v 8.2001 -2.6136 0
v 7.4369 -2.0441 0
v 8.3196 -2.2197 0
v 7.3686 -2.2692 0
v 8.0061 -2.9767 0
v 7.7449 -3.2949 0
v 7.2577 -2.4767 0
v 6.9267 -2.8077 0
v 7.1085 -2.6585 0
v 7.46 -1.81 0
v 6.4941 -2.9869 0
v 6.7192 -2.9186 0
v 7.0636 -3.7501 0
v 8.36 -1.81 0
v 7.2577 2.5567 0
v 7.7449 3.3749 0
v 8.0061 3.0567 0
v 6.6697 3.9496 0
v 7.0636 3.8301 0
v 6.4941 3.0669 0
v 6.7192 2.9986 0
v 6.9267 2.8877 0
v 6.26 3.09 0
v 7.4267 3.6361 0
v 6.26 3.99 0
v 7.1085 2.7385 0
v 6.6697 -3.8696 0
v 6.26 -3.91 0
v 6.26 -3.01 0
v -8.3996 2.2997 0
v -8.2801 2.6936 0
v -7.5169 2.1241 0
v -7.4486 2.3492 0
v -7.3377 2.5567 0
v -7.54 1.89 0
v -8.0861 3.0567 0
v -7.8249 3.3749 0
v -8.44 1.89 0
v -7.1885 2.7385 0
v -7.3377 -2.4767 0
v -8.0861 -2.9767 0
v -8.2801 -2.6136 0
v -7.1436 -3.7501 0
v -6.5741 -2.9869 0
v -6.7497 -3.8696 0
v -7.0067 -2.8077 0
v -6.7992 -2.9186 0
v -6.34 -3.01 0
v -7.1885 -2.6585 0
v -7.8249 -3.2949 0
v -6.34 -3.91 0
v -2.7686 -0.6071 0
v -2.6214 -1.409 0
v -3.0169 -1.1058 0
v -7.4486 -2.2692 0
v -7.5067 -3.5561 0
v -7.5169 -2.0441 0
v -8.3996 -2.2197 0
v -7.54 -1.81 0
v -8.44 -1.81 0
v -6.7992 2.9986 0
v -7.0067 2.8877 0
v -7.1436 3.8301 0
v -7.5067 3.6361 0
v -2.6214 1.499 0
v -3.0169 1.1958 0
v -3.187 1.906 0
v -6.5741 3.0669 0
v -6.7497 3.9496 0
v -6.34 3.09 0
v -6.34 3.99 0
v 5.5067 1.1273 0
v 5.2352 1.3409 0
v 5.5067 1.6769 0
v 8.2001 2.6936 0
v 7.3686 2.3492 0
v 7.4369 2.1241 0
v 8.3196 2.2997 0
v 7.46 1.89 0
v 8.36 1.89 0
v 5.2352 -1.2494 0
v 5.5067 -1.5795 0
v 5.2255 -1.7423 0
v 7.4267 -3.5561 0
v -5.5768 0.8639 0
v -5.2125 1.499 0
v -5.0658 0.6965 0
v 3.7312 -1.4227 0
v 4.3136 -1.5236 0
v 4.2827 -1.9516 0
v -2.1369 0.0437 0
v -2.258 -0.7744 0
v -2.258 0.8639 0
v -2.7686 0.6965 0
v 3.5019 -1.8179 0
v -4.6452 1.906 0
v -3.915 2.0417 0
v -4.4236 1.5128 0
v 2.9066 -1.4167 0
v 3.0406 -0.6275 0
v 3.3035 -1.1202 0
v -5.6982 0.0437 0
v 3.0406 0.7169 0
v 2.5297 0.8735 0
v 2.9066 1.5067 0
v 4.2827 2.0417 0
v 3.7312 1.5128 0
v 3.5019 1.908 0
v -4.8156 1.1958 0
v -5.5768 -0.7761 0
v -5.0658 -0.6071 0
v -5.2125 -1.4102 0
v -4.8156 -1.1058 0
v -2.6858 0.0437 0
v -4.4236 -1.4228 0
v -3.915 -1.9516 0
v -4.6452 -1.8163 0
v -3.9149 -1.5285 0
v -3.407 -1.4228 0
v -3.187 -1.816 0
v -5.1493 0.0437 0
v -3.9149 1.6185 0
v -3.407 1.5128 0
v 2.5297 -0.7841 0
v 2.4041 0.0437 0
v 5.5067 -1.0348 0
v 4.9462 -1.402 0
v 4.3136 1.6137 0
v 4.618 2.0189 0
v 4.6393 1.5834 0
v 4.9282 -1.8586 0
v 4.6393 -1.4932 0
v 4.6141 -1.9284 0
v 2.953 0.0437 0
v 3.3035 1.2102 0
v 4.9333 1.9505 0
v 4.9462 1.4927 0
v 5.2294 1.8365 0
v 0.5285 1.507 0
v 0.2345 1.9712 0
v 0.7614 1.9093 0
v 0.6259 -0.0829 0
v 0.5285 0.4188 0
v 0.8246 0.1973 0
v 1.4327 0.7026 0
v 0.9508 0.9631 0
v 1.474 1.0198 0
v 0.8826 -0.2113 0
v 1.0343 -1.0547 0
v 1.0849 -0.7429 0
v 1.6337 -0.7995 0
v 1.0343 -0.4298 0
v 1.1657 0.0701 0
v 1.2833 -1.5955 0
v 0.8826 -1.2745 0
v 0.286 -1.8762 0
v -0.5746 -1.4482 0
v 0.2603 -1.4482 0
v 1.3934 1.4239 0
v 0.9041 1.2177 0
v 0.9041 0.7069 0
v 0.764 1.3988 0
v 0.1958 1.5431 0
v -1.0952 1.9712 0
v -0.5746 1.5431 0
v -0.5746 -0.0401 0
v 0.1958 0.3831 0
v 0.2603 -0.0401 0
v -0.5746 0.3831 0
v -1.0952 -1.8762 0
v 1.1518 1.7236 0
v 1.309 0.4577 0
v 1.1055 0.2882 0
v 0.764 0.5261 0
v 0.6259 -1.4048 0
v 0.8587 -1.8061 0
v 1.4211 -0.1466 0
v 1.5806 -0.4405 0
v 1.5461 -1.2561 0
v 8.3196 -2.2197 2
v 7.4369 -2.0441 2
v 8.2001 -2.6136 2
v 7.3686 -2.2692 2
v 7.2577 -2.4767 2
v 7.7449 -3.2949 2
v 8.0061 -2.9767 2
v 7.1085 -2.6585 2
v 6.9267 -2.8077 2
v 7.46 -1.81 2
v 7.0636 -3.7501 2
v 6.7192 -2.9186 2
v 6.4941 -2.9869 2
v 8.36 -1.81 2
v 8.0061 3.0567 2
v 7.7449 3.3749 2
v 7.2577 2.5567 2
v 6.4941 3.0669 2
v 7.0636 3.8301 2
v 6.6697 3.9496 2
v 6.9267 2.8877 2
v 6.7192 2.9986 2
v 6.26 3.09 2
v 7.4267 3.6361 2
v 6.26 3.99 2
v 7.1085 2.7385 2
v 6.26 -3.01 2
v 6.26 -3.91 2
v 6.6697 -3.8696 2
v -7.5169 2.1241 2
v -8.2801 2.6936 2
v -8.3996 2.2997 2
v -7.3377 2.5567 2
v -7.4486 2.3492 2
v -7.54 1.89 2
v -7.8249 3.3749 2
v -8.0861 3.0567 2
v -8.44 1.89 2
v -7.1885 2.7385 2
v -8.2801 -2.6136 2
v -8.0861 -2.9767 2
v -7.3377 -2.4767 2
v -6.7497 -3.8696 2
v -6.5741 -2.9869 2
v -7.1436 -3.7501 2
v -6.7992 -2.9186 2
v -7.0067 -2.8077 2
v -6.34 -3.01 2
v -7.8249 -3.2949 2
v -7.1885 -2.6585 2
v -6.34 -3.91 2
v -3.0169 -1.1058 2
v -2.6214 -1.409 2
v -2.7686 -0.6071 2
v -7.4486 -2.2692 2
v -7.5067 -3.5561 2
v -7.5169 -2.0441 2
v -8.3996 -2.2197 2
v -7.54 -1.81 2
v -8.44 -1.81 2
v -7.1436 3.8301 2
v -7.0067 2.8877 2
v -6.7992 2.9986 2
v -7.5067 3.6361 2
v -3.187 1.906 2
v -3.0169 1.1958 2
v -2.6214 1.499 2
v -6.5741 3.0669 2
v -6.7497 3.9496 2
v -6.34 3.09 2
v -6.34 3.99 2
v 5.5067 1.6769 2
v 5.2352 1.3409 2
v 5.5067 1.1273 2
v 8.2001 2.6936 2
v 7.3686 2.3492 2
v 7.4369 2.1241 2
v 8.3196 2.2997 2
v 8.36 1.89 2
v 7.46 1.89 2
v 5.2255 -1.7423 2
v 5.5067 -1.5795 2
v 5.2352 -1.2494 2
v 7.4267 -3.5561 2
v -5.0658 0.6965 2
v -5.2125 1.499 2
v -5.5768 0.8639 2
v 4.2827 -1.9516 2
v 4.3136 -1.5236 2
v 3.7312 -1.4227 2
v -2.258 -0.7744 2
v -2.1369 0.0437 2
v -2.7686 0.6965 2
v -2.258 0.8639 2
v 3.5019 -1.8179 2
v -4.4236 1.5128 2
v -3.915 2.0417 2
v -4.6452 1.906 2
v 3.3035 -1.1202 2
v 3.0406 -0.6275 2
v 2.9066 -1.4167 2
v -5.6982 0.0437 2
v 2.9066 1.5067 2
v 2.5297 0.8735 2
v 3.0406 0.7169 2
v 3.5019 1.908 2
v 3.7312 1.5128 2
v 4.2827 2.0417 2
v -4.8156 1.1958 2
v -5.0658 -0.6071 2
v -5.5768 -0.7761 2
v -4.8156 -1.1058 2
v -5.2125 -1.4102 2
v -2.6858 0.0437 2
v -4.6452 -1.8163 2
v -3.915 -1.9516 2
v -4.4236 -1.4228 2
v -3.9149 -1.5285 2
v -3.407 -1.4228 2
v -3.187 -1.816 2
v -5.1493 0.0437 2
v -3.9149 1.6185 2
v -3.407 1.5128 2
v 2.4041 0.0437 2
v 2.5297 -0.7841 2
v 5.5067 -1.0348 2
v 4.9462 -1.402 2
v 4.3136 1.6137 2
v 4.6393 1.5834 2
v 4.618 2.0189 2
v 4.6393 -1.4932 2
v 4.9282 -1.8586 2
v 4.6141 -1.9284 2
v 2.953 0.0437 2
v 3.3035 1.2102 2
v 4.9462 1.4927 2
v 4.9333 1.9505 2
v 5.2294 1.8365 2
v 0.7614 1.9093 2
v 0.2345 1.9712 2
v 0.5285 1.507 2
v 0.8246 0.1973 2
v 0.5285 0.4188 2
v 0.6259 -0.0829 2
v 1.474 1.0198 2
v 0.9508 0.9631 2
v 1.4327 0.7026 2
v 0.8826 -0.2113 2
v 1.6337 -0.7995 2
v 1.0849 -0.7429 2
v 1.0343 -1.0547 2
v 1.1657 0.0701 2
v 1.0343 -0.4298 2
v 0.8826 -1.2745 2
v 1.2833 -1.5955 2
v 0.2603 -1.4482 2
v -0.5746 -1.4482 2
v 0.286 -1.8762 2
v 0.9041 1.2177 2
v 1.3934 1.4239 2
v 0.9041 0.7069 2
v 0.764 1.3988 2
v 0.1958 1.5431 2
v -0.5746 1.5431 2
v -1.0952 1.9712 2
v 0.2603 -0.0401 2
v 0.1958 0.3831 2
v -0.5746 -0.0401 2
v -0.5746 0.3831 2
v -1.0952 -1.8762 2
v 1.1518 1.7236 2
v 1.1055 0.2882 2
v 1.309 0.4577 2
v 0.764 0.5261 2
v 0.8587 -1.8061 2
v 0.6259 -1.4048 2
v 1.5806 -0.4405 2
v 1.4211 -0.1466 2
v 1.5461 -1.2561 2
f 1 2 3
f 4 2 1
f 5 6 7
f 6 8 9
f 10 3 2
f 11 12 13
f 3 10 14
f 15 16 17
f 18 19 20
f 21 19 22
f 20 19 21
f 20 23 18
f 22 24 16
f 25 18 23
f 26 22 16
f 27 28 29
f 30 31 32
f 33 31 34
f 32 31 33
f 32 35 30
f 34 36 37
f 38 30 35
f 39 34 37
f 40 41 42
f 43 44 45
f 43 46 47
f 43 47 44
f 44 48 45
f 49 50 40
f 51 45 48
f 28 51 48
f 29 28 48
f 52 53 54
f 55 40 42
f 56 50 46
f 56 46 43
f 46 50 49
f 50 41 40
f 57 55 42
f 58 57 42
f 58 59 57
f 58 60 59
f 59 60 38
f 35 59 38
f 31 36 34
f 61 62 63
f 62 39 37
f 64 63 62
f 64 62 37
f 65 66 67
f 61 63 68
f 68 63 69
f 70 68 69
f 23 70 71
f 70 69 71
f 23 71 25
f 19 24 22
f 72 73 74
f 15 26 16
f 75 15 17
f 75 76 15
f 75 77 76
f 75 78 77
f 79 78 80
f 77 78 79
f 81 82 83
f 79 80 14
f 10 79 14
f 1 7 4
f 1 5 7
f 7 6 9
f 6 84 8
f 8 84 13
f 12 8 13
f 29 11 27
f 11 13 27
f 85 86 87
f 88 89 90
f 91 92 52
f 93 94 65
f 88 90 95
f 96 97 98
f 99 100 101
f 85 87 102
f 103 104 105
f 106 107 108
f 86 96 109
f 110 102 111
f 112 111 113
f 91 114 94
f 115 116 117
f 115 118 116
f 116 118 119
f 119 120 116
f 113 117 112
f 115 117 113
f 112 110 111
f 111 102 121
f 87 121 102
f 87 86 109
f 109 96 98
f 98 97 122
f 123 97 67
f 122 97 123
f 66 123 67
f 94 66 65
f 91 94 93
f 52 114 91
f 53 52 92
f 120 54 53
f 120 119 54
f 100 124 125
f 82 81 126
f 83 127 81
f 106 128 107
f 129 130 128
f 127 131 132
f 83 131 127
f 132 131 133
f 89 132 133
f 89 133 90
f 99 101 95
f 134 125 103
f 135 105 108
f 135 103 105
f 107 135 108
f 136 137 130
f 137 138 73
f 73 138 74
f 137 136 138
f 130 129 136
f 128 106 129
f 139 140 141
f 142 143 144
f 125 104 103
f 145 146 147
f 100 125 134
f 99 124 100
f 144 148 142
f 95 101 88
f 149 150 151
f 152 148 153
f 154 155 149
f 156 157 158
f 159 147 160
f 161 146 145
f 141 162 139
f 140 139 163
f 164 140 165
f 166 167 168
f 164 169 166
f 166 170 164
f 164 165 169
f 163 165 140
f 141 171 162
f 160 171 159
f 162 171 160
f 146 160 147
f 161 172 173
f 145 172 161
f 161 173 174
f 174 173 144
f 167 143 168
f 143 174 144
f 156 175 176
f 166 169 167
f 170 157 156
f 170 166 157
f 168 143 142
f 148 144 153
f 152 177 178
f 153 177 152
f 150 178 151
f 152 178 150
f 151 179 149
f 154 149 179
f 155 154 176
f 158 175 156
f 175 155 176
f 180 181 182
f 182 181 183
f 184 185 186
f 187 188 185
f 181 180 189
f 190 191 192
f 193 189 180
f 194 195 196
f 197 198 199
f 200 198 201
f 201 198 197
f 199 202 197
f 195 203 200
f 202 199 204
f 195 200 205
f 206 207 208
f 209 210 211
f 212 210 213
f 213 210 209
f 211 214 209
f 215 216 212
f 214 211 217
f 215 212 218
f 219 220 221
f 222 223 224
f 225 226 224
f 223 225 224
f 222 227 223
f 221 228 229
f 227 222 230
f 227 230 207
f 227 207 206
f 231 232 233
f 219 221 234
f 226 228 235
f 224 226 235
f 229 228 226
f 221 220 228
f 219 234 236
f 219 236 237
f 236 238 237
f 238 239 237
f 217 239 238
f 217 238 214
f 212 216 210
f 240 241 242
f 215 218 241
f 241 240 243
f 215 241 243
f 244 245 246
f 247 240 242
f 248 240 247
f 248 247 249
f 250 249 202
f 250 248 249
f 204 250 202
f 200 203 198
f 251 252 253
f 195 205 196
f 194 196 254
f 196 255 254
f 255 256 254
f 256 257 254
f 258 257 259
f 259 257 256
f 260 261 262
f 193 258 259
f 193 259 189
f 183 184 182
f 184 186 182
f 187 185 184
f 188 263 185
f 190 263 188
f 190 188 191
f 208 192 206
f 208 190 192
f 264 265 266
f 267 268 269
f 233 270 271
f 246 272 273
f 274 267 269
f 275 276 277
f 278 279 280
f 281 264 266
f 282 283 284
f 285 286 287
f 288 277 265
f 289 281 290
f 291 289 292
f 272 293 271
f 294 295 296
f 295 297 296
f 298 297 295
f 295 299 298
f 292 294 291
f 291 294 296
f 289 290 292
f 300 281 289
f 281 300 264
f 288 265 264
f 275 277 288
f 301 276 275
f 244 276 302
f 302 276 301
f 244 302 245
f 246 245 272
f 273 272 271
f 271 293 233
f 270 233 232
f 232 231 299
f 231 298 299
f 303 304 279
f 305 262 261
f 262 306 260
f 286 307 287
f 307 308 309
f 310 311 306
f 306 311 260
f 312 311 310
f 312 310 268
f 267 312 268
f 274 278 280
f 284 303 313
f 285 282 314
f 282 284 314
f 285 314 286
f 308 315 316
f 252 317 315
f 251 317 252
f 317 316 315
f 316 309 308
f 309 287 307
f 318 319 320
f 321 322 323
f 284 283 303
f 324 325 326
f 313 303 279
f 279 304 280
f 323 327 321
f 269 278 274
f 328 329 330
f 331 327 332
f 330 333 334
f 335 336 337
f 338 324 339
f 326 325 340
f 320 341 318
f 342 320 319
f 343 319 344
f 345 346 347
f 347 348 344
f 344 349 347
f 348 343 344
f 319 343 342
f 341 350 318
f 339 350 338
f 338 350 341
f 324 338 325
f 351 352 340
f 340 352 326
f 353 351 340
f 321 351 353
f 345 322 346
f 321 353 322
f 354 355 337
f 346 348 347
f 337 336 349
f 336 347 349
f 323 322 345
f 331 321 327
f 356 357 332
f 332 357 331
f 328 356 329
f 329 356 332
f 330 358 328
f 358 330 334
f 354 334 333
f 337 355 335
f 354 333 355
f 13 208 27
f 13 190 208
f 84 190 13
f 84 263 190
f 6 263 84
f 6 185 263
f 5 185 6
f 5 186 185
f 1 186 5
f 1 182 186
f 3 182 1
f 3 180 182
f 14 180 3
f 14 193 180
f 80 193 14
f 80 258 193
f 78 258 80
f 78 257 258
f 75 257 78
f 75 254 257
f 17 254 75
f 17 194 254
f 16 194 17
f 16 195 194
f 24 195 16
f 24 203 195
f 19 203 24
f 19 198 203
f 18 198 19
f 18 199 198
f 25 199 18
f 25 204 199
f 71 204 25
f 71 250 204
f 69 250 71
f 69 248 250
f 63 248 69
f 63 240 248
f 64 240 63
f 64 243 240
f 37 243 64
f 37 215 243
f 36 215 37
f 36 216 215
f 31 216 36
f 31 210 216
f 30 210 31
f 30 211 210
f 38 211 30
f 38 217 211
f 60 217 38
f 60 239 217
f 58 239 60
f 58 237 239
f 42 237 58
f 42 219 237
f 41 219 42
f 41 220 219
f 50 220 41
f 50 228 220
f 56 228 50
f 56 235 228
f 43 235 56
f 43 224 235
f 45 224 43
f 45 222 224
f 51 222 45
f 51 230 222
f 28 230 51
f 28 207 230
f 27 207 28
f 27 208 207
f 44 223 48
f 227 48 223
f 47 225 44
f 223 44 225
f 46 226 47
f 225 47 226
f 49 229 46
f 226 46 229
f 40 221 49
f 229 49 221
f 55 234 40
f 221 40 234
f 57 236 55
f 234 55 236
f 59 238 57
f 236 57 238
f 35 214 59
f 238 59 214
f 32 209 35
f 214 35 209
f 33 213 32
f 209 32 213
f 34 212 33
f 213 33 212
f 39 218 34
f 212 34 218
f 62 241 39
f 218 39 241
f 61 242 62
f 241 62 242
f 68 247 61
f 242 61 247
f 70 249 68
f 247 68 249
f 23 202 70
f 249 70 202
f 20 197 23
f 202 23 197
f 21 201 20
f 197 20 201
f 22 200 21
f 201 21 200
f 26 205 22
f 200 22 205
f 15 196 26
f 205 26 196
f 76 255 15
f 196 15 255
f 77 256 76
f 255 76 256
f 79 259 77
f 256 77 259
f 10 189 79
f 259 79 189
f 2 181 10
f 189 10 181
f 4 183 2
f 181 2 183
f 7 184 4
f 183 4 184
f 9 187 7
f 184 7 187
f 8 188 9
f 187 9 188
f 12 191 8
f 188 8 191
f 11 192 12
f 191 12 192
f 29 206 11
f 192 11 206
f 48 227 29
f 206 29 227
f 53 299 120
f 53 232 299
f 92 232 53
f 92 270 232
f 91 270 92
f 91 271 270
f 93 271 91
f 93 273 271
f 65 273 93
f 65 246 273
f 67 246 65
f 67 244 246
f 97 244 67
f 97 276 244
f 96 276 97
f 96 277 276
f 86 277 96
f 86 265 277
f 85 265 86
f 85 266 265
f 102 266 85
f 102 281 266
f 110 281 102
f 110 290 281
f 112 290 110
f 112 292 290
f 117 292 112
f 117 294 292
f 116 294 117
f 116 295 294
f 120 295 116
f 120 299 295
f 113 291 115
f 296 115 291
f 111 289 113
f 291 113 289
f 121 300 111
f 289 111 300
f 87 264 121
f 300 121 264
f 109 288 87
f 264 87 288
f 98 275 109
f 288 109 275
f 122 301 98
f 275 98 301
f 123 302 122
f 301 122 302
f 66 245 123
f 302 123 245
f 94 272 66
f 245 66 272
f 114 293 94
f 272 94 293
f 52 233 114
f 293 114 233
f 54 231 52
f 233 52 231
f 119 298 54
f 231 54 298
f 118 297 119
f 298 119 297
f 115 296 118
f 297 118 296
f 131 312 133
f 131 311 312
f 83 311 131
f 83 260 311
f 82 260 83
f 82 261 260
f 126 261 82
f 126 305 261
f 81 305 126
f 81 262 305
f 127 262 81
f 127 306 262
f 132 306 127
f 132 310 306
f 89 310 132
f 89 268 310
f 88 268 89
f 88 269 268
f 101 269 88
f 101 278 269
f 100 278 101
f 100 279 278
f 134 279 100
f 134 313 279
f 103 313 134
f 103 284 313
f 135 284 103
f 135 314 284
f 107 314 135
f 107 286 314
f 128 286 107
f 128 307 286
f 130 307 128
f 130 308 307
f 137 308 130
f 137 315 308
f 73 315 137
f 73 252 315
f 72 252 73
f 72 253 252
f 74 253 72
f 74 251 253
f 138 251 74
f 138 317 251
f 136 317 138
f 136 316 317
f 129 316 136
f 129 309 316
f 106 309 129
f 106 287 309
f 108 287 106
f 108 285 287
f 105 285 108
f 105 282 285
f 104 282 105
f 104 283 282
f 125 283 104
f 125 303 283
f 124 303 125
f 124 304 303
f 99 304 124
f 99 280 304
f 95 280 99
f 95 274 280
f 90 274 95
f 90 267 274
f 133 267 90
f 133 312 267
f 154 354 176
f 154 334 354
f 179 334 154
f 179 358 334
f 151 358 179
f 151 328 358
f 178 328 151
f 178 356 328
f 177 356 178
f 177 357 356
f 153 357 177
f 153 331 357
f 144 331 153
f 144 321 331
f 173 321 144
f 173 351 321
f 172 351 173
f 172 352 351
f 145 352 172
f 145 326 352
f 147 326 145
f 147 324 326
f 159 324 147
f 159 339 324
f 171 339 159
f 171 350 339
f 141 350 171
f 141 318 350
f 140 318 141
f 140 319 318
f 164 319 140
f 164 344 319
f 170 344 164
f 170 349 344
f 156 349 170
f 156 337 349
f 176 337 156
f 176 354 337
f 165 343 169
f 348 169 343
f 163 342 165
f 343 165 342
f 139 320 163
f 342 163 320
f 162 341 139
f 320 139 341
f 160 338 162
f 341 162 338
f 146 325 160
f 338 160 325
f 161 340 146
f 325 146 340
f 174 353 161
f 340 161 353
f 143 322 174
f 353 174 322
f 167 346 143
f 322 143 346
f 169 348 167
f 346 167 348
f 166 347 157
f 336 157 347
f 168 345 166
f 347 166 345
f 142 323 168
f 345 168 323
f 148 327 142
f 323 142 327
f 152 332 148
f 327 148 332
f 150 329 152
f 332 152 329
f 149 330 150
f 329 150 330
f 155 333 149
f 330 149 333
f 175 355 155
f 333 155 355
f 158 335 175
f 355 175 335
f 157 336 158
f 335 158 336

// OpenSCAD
// Five candidate OBC marks (2026-10-14), each drawn at the smallest size it
// engraves cleanly under a print, 16 to 22 mm across. The same 2D shape is the
// logo and the cutter, so what the preview shows is what the printer gets.
//
// design = 1..5; each is 2D, centred on the origin, in mm.
//   1 stamp    OBC in a heavy sans inside a rounded frame, a maker's stamp
//   2 scallop  OBC in rounded letters inside a scalloped badge, like a sticker
//   3 ribbon   OBC knocked out of a ribbon banner
//   4 face     a round O with a kawaii face, then BC
//   5 toolpath OBC in one even line with round ends, as the nozzle draws it
design = 1;

// a stroke this wide is two beads on the 0.4 mm nozzle: the floor for every
// line, and for every wall left between two cuts
B2 = 0.9;

module ring(od, w) difference() { circle(d = od, $fn = 96); circle(d = od - 2 * w, $fn = 96); }

// Every stroke is opened by a bead: offset in by half a bead, back out. What
// a 0.4 mm nozzle cannot draw is taken out of the drawing, so the logo and the
// print agree.
module printable() offset(r = 0.21, $fn = 12) offset(delta = -0.21) children();
// and every gap between strokes closed if it is narrower than a wall
module closed() offset(r = -B2 / 2, $fn = 12) offset(delta = B2 / 2) children();

// the frame clears the letters by 1.1 everywhere, a wall two beads and more
module stamp() {
    text("OBC", size = 3.8, font = "Montserrat:style=Black", halign = "center", valign = "center", spacing = 1.08);
    translate([-0.04, 0.04]) difference() {
        offset(r = 2.1, $fn = 32) square([12.6, 3.7], center = true);
        offset(r = 1.2, $fn = 32) square([12.6, 3.7], center = true);
    }
}

// the badge: a disc with fourteen scallops round it, its edge a band two
// beads wide that follows the scallops; the letters rounded, like a sticker
module badge2d() { circle(r = 7.0, $fn = 96); for (i = [0 : 13]) rotate(360 * i / 14) translate([7.0, 0]) circle(r = 1.6, $fn = 32); }
module scallop() {
    text("OBC", size = 3.9, font = "Fredoka:style=SemiBold", halign = "center", valign = "center", spacing = 1.16);
    closed() difference() { badge2d(); offset(r = -B2, $fn = 32) badge2d(); }    // cusps between scallops rounded, as they print
}

// OBC knocked out of a ribbon: the band is cut, the letters are what stays,
// so the letters are walls and need two beads, which Montserrat Black has.
// Each tail drops behind the band, a fold line two beads wide between them, and
// ends in a V. (Layer lines through OBC were tried here first: at a size that
// fits under a print, any line through the B runs through its counters.)
RBW = 15.4; RBH = 6.2;
module ribbon() printable() {
    difference() {
        offset(r = 0.4, $fn = 16) square([RBW - 0.8, RBH - 0.8], center = true);
        text("OBC", size = 3.8, font = "Montserrat:style=Black", halign = "center", valign = "center", spacing = 1.08);
    }
    for (s = [-1, 1]) mirror([s > 0 ? 0 : 1, 0]) translate([RBW / 2 + B2, -1.0])
        polygon([[0, -RBH / 2 + 0.6], [2.6, -RBH / 2 + 0.6], [1.5, 0], [2.6, RBH / 2 - 0.6], [0, RBH / 2 - 0.6]]);
}

// the eyes clear the ring and the smile by two beads; BC clears the O by two
module face() {
    translate([-3.0, 0]) {
        ring(7.6, 1.05);
        for (s = [-1, 1]) translate([s * 0.95, 0.9]) circle(d = 1.1, $fn = 32);
        intersection() {
            translate([0, 0.1]) ring(2.9, B2);
            translate([-3, -3]) square([6, 2.45]);
        }
    }
    translate([5.45, -0.05]) text("BC", size = 4.3, font = "Fredoka:style=SemiBold", halign = "center", valign = "center", spacing = 1.12);
}

// OBC in one even line with round ends, the way the nozzle draws: every
// stroke W wide, every counter and gap 0.9 or more. (A joined script was tried
// here first: at any size that fits under a print the b's loop closes.)
W = 1.0; H = 5.6;
function arc(c, r, a0, a1, n = 24) = [for (i = [0 : n]) let (a = a0 + (a1 - a0) * i / n) [c[0] + r * cos(a), c[1] + r * sin(a)]];
module stroke(pts) for (i = [0 : len(pts) - 2]) hull() { translate(pts[i]) circle(d = W, $fn = 24); translate(pts[i + 1]) circle(d = W, $fn = 24); }
module toolpath() translate([-4.95, -H / 2]) {
    yt = H - W / 2; yb = W / 2; ym = 2.8;
    rU = (yt - ym) / 2; rL = (ym - yb) / 2;
    stroke(arc([0, H / 2], H / 2 - W / 2, 0, 360, 48));                                         // O
    xb = 4.2;                                                                                   // B
    stroke(concat([[xb, yb], [xb, yt], [xb + 0.9, yt]], arc([xb + 0.9, ym + rU], rU, 90, -90),
                  [[xb, ym], [xb + 1.2, ym]], arc([xb + 1.2, yb + rL], rL, 90, -90), [[xb, yb]]));
    stroke(arc([10.65, H / 2], H / 2 - W / 2, 45, 315, 40));                                   // C
}

// the mark printed today, for reference
module current() text("OBC", size = 5.0, font = "Montserrat:style=Black", halign = "center", valign = "center", spacing = 1.16);

module logo(d) {
    if (d == 0) current();
    if (d == 1) stamp();
    if (d == 2) scallop();
    if (d == 3) ribbon();
    if (d == 4) face();
    if (d == 5) toolpath();
}
linear_extrude(2) logo(design);
